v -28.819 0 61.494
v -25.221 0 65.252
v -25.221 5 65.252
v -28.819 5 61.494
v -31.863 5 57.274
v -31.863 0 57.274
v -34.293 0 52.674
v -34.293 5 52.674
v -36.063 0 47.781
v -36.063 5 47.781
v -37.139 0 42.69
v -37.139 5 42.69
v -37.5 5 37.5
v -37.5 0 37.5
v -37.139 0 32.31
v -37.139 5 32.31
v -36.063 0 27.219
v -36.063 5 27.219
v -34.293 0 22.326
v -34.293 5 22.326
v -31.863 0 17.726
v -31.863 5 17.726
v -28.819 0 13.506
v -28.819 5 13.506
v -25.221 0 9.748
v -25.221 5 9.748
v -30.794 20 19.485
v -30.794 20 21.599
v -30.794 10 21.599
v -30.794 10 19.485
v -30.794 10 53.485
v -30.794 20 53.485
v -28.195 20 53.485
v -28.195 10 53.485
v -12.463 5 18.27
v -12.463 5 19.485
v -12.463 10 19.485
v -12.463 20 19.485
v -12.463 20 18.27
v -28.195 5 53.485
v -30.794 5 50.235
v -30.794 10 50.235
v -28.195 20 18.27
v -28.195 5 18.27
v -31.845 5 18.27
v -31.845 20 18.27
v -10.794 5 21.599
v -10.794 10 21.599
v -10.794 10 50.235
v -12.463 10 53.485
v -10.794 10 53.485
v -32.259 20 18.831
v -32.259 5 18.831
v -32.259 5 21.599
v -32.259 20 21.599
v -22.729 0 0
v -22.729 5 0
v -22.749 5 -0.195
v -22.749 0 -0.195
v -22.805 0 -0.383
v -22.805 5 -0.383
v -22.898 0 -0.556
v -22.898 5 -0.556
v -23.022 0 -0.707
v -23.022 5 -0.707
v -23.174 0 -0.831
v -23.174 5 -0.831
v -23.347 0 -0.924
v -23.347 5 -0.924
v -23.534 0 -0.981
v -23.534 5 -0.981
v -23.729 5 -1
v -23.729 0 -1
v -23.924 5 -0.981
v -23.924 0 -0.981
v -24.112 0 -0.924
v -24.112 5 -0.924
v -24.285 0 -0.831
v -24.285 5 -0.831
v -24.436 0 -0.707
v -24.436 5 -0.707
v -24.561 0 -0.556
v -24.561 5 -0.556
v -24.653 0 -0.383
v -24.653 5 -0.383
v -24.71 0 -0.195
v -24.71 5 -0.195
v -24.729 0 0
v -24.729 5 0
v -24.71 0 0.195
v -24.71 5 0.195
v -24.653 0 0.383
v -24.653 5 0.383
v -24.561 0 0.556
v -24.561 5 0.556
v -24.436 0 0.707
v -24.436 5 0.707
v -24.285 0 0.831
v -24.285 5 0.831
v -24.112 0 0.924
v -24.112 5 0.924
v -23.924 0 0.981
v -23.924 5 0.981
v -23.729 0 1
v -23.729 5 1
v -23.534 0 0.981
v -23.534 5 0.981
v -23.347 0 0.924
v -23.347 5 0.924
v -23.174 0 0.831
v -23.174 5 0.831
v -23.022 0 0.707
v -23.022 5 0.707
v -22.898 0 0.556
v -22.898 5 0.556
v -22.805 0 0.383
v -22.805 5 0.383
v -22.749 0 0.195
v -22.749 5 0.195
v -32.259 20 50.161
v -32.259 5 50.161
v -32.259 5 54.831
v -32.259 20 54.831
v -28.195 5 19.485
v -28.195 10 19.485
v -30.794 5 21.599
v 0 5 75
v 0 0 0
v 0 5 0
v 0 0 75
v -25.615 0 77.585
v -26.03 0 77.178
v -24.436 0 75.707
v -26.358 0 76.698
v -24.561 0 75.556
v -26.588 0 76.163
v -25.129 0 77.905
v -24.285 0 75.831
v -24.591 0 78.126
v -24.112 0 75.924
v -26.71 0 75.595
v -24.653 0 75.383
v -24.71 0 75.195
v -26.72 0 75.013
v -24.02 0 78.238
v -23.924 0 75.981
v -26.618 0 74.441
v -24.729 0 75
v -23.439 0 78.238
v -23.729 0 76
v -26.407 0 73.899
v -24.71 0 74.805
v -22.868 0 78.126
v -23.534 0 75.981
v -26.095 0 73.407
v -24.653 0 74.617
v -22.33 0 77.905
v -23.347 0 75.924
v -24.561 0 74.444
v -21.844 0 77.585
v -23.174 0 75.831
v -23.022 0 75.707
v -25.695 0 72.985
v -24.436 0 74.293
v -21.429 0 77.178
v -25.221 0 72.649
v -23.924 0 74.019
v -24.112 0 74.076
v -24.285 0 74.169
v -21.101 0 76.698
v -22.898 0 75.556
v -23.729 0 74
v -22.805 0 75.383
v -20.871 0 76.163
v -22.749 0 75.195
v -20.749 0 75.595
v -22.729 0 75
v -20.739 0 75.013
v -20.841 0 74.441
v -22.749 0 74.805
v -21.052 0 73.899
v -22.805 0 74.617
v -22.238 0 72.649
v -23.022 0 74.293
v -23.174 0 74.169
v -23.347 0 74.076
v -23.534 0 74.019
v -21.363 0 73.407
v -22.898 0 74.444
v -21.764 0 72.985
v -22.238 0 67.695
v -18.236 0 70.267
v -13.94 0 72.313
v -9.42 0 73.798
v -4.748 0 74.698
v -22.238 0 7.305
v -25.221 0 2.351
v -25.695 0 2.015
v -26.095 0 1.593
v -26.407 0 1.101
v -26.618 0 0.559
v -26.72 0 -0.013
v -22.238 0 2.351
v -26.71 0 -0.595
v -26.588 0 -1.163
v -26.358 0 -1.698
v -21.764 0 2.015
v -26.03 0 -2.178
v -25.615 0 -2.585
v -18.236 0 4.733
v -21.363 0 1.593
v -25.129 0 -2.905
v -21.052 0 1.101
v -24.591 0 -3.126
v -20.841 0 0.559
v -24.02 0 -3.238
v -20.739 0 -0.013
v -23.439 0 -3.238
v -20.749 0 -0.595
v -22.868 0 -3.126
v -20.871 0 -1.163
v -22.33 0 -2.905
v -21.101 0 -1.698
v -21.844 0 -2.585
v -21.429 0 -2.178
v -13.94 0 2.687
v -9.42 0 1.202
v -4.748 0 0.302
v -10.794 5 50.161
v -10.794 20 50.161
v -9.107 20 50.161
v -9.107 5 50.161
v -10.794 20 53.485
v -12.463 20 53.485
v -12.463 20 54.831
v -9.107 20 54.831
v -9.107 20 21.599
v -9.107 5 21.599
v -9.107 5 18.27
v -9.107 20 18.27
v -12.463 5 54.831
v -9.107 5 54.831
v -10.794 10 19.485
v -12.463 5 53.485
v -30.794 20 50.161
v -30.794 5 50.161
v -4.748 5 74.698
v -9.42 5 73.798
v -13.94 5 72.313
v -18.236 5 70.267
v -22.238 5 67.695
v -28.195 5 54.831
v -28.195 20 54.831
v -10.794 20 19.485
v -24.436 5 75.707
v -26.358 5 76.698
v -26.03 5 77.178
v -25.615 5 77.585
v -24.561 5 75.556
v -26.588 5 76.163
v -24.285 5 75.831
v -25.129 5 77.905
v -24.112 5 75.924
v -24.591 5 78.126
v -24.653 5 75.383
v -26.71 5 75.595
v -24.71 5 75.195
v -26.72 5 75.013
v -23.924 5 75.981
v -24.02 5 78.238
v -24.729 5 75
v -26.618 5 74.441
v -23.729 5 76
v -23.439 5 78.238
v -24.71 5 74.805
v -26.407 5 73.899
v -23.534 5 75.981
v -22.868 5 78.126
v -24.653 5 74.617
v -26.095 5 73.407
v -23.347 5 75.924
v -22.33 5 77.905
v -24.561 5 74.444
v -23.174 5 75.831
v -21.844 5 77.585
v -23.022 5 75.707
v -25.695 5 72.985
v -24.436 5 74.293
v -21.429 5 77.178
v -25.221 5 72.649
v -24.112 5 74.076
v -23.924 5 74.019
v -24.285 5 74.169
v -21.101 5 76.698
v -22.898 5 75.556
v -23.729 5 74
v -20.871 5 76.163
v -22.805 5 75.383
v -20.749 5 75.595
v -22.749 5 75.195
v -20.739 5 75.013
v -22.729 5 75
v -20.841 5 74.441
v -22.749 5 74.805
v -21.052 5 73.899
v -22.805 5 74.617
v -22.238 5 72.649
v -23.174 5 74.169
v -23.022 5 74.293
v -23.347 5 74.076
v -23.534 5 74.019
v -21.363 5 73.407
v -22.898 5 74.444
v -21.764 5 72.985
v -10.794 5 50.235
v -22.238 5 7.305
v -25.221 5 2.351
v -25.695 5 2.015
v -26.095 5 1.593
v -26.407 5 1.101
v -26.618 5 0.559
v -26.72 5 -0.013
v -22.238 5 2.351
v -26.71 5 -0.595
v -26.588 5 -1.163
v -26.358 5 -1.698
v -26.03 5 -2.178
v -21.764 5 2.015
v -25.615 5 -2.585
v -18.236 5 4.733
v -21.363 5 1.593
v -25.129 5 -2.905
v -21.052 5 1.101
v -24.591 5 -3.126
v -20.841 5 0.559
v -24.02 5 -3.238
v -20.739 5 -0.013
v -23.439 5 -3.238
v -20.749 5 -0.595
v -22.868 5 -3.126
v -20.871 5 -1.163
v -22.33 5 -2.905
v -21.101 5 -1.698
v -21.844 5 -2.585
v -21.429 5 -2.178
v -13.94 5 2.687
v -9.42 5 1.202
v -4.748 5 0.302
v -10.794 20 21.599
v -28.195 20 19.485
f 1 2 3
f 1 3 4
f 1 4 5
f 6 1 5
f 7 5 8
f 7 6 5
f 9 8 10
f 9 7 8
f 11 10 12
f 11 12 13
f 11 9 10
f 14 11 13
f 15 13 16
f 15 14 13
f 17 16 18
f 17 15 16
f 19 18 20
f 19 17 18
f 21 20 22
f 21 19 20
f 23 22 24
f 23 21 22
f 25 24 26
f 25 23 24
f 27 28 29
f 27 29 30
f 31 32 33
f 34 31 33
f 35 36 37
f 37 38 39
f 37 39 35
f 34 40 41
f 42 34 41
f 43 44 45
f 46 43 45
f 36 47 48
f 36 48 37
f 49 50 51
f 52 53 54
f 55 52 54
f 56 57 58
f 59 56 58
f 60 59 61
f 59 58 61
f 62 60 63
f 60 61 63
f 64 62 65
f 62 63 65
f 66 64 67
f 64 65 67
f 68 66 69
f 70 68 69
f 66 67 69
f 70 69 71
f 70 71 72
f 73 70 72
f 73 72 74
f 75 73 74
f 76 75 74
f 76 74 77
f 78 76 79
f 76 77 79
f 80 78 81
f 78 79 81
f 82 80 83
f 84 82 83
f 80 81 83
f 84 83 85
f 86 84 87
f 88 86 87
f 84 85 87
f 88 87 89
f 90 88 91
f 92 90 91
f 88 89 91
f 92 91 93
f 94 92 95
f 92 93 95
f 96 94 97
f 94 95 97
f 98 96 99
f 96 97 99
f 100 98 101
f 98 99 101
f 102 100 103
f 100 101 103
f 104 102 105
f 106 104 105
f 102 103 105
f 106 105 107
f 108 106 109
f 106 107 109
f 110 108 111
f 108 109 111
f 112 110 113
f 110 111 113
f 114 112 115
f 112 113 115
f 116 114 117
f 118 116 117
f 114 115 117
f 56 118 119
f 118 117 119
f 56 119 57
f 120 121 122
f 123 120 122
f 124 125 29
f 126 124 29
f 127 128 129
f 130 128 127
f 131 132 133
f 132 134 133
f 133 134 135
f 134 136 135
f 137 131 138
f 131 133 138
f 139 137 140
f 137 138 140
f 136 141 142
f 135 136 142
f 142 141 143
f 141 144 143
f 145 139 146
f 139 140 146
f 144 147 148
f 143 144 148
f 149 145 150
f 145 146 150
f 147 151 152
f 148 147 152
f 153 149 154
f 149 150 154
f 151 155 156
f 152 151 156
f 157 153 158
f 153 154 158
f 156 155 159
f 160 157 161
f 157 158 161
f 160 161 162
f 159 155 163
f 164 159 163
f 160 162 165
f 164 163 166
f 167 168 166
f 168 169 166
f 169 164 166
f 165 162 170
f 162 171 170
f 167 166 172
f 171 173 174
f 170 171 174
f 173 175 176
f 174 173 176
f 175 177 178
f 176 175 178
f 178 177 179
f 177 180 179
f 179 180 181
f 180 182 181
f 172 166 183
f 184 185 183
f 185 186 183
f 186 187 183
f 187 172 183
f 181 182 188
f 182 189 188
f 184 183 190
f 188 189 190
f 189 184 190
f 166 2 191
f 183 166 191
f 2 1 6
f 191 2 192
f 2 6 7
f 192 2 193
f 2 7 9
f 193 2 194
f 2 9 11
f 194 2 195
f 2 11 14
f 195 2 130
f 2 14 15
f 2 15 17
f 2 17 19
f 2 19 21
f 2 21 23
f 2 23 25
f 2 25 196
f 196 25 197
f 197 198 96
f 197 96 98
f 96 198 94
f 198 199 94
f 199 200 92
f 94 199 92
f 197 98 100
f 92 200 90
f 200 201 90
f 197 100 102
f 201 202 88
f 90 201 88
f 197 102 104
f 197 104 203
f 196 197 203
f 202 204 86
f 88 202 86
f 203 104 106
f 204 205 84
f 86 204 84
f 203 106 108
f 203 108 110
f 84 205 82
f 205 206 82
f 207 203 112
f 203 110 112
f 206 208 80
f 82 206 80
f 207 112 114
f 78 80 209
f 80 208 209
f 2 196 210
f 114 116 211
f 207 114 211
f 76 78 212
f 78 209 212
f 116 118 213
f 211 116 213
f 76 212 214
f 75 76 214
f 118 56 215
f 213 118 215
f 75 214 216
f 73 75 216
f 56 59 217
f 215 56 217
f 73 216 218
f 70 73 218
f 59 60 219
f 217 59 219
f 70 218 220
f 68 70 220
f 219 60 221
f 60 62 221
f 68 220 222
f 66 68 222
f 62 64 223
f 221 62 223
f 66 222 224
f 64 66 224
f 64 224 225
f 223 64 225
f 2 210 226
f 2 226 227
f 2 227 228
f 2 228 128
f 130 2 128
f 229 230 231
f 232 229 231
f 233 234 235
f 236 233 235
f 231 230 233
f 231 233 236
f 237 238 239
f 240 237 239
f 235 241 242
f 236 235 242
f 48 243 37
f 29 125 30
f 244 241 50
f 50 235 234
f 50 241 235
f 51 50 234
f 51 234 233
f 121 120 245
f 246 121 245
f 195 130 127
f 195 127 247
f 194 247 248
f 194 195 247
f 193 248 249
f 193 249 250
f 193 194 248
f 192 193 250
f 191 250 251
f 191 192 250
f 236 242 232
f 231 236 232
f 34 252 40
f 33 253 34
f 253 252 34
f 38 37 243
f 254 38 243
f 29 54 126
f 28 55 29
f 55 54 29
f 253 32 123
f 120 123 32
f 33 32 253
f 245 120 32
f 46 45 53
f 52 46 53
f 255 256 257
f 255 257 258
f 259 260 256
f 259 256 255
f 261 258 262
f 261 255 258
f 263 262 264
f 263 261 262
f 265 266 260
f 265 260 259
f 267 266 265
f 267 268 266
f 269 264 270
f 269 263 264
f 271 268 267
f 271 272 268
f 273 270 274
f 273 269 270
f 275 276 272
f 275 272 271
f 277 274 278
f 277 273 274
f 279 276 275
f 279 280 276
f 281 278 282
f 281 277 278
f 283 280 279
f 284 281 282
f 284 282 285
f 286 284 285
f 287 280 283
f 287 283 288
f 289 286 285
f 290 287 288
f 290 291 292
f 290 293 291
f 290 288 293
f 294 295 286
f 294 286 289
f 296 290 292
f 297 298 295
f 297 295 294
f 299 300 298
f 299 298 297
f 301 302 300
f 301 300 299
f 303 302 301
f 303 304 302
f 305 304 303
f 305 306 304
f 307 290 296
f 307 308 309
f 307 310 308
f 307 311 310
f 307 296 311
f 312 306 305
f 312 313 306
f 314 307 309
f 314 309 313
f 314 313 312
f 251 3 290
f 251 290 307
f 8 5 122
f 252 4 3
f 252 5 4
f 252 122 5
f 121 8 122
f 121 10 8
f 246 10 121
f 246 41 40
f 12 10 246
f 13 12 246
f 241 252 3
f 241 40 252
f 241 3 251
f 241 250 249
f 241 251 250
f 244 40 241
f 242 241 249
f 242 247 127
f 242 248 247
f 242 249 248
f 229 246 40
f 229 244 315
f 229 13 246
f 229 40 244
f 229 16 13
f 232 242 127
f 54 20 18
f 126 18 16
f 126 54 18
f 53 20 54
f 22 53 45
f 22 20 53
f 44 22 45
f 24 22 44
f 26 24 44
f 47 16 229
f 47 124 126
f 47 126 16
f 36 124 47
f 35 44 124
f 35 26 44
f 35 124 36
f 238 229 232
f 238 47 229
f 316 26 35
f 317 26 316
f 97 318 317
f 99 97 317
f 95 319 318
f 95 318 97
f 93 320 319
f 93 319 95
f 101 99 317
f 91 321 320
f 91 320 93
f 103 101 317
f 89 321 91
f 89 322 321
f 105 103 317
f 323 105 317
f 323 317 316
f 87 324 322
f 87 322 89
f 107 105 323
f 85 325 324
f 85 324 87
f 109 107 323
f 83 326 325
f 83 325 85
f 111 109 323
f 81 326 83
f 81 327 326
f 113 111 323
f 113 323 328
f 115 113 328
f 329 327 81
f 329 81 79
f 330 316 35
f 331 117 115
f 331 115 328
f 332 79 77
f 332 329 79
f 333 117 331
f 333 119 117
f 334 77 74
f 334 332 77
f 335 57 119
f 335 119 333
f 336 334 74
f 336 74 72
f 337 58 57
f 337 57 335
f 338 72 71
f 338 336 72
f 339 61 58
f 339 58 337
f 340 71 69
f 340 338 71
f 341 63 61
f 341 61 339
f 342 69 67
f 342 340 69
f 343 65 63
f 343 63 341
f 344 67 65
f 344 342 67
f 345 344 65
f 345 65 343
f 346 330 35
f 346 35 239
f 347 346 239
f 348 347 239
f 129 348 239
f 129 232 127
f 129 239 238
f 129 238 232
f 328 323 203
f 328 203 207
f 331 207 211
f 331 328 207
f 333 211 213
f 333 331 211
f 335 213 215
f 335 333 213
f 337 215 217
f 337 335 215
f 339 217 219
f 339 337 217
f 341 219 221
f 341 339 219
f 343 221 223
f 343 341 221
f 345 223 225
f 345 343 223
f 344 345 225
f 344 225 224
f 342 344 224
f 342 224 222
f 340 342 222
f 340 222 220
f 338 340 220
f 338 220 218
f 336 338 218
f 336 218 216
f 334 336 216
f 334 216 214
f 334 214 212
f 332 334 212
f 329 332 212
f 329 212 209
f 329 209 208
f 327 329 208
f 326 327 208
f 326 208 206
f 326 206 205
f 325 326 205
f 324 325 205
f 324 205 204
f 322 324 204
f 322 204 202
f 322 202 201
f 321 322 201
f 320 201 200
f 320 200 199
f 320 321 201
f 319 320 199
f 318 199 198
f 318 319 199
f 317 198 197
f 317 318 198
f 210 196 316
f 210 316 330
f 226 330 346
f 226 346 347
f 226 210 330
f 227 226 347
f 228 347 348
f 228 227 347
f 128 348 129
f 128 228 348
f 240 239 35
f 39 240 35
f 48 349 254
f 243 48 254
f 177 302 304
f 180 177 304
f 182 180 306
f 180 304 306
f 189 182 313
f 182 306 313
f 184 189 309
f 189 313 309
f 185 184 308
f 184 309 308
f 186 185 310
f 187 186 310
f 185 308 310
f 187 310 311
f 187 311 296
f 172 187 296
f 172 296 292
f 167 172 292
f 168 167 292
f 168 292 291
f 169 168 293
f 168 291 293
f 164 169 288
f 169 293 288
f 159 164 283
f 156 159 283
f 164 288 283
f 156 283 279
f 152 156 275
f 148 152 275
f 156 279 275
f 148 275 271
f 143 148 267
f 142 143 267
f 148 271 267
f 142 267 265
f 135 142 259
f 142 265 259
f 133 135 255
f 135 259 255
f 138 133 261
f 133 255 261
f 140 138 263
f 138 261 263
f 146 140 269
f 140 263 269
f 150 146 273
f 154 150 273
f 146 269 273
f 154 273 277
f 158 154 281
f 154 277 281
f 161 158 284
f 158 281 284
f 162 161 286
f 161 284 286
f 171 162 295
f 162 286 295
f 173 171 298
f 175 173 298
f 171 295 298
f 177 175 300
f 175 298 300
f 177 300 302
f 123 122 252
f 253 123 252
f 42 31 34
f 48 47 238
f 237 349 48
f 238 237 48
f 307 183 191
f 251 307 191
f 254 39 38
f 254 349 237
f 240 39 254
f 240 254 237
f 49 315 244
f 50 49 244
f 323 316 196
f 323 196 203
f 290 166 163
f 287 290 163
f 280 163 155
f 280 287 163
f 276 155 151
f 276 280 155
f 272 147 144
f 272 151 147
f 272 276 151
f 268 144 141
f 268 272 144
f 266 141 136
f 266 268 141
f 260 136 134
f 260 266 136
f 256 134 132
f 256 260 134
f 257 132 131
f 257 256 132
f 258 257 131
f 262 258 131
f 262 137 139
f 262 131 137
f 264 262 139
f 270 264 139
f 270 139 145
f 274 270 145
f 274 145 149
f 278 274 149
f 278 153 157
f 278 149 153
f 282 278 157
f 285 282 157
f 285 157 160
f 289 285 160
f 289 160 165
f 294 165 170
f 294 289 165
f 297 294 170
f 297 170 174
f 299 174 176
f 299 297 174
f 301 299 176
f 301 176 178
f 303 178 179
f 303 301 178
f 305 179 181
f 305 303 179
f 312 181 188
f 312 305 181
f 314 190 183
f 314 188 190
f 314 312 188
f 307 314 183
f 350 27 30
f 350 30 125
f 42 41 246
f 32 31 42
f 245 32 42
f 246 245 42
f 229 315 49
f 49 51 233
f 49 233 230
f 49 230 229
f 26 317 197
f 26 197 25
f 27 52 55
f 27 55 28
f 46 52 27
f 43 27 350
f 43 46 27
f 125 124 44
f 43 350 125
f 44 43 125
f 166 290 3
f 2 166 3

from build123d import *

# Parameters (mm, degrees)
AUFSATZ_LINEAR_AUSTRAGEN1_DEPTH = 5
AUFSATZ_LINEAR_AUSTRAGEN2_DEPTH = 5
SKIZZE5_R                       = 3
AUFSATZ_LINEAR_AUSTRAGEN3_DEPTH = 5
SKIZZE6_R                       = 1
SCHNITT_LINEAR_AUSTRAGEN3_DEPTH = 5
AUFSATZ_LINEAR_AUSTRAGEN4_DEPTH = 15
SKIZZE8_W                       = 20
SKIZZE8_H                       = 34
SCHNITT_LINEAR_AUSTRAGEN4_DEPTH = 15
SKIZZE9_W                       = 15.731932776
SKIZZE9_H                       = 1.345677625
SKIZZE9_W_2                     = 1.464910579
SKIZZE9_H_2                     = 28.562069045
SKIZZE9_H_3                     = 1.21563576
SKIZZE9_W_3                     = 1.686857954
SCHNITT_LINEAR_AUSTRAGEN5_DEPTH = 15
AUFSATZ_LINEAR_AUSTRAGEN5_DEPTH = 5


with BuildPart() as part:
    # Skizze1 → Aufsatz-Linear austragen1 (new body)
    with BuildSketch(Plane(origin=(0, 0, 0), x_dir=(1, 0, 0), z_dir=(0, 1, 0))):
        with BuildLine():
            Line((0, 0), (0, -75))
            ThreePointArc((0, -75), (-37.5, -37.5), (0, 0))
        make_face()
    extrude(amount=AUFSATZ_LINEAR_AUSTRAGEN1_DEPTH)

    # Skizze4 → Aufsatz-Linear austragen2 (add)
    with BuildSketch(Plane(origin=(0, 5, 0), x_dir=(1, 0, 0), z_dir=(0, 1, 0))):
        Polygon((-22.238082181, -7.305336549), (-22.238082181, 0.251909769), (-25.220656299, 0.251909769), (-25.220656299, -9.748090231), (-22.238082181, -9.748090231), align=None)
        Polygon((-22.238082181, -67.694663451), (-22.238082181, -75.251909769), (-25.220656299, -75.251909769), (-25.220656299, -65.251909769), (-22.238082181, -65.251909769), align=None)
    extrude(amount=-AUFSATZ_LINEAR_AUSTRAGEN2_DEPTH)

    # Skizze5 → Aufsatz-Linear austragen3 (add)
    with BuildSketch(Plane(origin=(0, 5, 0), x_dir=(1, 0, 0), z_dir=(0, 1, 0))):
        with Locations((-23.72936924, 0.251909769)):
            Circle(SKIZZE5_R)
        with Locations((-23.72936924, -75.251909769)):
            Circle(SKIZZE5_R)
    extrude(amount=-AUFSATZ_LINEAR_AUSTRAGEN3_DEPTH)

    # Skizze6 → Schnitt-Linear austragen3 (cut)
    with BuildSketch(Plane(origin=(0, 5, 0), x_dir=(1, 0, 0), z_dir=(0, 1, 0))):
        with Locations((-23.72936924, 0)):
            Circle(SKIZZE6_R)
        with Locations((-23.72936924, -75)):
            Circle(SKIZZE6_R)
    extrude(amount=-SCHNITT_LINEAR_AUSTRAGEN3_DEPTH, mode=Mode.SUBTRACT)

    # Skizze7 → Aufsatz-Linear austragen4 (add)
    with BuildSketch(Plane(origin=(0, 5, 0), x_dir=(1, 0, 0), z_dir=(0, 1, 0))):
        Polygon((-32.258719726, -18.830892905), (-32.258719726, -54.830892905), (-9.106951193, -54.830892905), (-9.106951193, -18.26957952), (-31.844703161, -18.26957952), align=None)
    extrude(amount=AUFSATZ_LINEAR_AUSTRAGEN4_DEPTH)

    # Skizze8 → Schnitt-Linear austragen4 (cut)
    with BuildSketch(Plane(origin=(0, 20, 0), x_dir=(1, 0, 0), z_dir=(0, 1, 0))):
        with Locations((-20.793809147, -36.48521528)):
            Rectangle(SKIZZE8_W, SKIZZE8_H)
    extrude(amount=-SCHNITT_LINEAR_AUSTRAGEN4_DEPTH, mode=Mode.SUBTRACT)

    # Skizze9 → Schnitt-Linear austragen5 (cut)
    with BuildSketch(Plane(origin=(0, 20, 0), x_dir=(1, 0, 0), z_dir=(0, 1, 0))):
        with Locations((-20.328643091, -54.158054093)):
            Rectangle(SKIZZE9_W, SKIZZE9_H)
        with Locations((-31.526264436, -35.879751076)):
            Rectangle(SKIZZE9_W_2, SKIZZE9_H_2)
        with Locations((-20.328643091, -18.8773974)):
            Rectangle(SKIZZE9_W, SKIZZE9_H_3)
        with Locations((-9.95038017, -35.879751076)):
            Rectangle(SKIZZE9_W_3, SKIZZE9_H_2)
    extrude(amount=-SCHNITT_LINEAR_AUSTRAGEN5_DEPTH, mode=Mode.SUBTRACT)

    # Skizze10 → Aufsatz-Linear austragen5 (add)
    with BuildSketch(Plane(origin=(0, 5, 0), x_dir=(1, 0, 0), z_dir=(0, 1, 0))):
        Polygon((-28.194609479, -53.48521528), (-30.793809147, -50.234762972), (-30.793809147, -53.48521528), align=None)
        Polygon((-30.793809147, -21.598716553), (-30.793809147, -19.48521528), (-28.194609479, -19.48521528), align=None)
        Polygon((-12.462676703, -19.48521528), (-10.793809147, -19.48521528), (-10.793809147, -21.598716553), align=None)
        Polygon((-12.462676703, -53.48521528), (-10.793809147, -53.48521528), (-10.793809147, -50.234762972), align=None)
    extrude(amount=AUFSATZ_LINEAR_AUSTRAGEN5_DEPTH)


solid = part.part
